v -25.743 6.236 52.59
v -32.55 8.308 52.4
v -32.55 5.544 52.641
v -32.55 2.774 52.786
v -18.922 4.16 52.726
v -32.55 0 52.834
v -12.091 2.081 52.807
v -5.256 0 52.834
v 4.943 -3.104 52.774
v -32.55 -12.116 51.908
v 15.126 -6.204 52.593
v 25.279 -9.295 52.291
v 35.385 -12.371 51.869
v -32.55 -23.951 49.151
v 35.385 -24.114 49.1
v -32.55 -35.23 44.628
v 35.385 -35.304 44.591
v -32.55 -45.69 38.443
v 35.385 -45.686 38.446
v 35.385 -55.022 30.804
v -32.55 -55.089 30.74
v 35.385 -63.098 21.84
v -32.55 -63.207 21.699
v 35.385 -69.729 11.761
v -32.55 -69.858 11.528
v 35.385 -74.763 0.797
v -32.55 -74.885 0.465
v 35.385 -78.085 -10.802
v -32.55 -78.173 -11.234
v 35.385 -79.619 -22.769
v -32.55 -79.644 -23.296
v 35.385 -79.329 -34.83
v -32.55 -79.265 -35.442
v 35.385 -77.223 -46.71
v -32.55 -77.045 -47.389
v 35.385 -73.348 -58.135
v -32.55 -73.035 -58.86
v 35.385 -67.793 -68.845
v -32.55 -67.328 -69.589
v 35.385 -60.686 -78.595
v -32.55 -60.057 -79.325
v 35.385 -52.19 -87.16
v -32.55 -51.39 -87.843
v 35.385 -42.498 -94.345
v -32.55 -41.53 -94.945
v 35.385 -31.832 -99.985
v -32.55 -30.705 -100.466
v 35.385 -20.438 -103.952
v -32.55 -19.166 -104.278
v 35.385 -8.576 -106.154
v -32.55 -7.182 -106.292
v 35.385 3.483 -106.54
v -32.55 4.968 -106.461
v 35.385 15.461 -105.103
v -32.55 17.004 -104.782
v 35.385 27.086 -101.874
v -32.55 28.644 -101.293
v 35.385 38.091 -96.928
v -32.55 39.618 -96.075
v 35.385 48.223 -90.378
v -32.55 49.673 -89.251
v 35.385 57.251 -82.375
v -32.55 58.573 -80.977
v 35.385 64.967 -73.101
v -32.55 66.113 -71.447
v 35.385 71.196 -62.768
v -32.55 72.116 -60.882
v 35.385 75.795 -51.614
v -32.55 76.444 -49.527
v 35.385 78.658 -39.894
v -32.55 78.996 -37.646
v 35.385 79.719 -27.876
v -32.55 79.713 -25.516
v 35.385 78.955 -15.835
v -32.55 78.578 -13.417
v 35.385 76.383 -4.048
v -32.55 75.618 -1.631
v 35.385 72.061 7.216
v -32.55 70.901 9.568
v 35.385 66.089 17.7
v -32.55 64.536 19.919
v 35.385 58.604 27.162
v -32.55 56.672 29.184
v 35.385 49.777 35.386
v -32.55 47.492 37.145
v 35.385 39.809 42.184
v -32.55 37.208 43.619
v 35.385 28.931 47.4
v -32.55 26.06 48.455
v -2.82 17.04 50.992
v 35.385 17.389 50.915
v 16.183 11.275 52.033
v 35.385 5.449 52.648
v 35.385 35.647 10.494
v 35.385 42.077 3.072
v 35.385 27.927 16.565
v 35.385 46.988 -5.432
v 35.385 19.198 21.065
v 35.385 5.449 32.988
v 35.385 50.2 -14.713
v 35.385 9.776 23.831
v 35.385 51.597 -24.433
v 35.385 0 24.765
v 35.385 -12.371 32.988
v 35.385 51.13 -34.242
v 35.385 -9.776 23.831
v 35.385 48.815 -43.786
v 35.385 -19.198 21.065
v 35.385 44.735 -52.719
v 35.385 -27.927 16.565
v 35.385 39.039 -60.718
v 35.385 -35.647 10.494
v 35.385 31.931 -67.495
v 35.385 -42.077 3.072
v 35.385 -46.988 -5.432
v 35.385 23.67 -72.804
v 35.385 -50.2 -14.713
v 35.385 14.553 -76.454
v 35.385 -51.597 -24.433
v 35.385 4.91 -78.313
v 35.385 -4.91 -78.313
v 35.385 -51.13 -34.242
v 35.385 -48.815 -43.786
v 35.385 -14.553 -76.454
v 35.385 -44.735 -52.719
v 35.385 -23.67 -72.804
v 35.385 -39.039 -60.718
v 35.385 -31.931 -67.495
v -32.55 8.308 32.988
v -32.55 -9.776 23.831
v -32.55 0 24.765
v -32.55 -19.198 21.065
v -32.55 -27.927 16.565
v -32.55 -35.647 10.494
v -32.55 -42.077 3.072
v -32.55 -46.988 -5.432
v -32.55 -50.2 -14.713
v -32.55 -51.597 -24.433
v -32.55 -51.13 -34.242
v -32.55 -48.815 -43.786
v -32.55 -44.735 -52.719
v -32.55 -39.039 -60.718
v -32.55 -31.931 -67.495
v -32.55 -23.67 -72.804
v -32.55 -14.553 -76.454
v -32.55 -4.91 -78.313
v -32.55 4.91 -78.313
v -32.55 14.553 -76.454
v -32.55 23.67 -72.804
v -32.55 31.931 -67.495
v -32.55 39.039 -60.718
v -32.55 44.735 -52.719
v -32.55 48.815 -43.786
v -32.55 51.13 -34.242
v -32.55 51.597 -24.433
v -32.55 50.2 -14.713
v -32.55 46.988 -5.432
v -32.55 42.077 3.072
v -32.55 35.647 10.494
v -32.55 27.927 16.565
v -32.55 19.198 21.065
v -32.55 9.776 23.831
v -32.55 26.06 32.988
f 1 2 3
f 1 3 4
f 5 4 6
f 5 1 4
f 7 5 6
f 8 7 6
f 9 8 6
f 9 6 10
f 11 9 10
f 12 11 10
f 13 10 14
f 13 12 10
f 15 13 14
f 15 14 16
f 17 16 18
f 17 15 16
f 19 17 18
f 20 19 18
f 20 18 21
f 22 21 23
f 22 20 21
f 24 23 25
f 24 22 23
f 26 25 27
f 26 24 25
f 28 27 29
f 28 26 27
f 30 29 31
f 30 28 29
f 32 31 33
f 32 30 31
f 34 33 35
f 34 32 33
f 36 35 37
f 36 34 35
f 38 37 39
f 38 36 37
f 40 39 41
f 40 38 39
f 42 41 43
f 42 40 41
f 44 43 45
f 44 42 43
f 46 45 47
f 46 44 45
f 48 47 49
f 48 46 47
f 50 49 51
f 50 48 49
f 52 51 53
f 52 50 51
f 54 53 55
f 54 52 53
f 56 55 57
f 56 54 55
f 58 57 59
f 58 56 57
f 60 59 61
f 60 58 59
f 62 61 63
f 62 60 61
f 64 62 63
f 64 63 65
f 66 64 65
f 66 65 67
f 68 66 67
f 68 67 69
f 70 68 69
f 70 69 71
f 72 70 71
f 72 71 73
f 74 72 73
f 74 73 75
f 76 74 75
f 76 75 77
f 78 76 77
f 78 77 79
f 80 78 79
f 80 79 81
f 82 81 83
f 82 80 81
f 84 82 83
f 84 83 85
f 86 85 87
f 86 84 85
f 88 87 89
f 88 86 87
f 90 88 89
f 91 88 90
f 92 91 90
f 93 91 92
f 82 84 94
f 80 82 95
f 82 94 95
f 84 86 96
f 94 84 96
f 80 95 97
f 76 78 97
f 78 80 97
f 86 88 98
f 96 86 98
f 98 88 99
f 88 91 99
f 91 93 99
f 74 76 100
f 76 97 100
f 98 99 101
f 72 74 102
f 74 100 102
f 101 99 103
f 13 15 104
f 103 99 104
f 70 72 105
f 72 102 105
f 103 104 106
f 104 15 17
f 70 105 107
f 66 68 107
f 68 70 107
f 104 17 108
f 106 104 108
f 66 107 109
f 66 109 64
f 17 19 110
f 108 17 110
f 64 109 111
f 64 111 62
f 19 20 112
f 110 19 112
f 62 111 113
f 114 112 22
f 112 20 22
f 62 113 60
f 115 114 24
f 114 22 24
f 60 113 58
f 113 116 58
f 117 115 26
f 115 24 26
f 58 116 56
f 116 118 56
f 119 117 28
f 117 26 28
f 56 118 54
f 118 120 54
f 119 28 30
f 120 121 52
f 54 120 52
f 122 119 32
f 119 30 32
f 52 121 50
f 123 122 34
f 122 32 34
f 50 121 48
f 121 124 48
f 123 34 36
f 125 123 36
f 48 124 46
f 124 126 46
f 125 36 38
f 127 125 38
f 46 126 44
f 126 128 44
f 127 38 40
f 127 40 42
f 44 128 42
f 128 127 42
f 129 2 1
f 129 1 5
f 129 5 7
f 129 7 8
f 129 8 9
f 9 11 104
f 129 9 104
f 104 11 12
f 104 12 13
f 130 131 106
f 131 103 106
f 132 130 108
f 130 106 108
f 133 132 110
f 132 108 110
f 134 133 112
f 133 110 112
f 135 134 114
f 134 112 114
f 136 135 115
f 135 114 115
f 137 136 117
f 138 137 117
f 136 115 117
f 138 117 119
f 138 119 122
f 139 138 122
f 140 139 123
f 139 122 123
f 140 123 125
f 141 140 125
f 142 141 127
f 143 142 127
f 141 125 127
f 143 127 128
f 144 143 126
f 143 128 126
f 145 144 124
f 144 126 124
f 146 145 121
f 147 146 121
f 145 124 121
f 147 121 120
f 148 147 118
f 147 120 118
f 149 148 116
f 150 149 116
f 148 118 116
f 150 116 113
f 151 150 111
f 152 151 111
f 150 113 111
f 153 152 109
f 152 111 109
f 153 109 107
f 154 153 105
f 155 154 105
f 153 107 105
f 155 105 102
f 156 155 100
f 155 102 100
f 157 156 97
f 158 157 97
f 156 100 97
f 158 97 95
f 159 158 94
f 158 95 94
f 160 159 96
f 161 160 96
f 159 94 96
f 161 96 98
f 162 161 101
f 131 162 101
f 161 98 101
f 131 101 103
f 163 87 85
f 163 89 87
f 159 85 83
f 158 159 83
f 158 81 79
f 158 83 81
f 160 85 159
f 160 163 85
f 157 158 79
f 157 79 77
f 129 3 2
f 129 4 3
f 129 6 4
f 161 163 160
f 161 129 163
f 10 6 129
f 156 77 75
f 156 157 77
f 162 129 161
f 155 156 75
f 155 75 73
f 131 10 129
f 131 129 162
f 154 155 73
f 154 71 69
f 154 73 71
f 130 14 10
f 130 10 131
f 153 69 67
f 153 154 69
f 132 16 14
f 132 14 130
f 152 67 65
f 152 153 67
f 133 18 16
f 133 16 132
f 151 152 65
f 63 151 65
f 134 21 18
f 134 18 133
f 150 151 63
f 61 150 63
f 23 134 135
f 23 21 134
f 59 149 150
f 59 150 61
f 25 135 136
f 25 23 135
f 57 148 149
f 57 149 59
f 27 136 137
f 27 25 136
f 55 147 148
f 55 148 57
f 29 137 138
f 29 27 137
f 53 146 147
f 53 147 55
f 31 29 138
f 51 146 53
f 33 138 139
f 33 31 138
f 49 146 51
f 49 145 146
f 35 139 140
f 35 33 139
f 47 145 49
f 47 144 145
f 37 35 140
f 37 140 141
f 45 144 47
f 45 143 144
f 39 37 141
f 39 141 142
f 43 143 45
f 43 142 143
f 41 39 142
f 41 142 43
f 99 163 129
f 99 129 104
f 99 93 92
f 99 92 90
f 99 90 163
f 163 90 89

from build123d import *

# Parameters (mm, degrees)
F0_W     = 67.935511
F0_H     = 28.069519
F4_DEPTH = 20.973967


with BuildPart() as f1:
    # F0 (on Front) → F1 (revolve)
    with BuildSketch(Plane.XZ):
        with Locations((1.417562, 38.79952)):
            Rectangle(F0_W, F0_H)
    revolve(axis=Axis((8.571956, 0, -26.890948), (1, 0, 0)))

    # F3 (on offset) → F4 (cut)
    with BuildSketch(Plane.XY.offset(53.962)):
        Polygon((53.347535, 0), (-46.056576, 30.157462), (-45.957059, 12.388781), (53.227343, -17.801717), align=None)
    extrude(amount=-F4_DEPTH, mode=Mode.SUBTRACT)


solid = f1.part
